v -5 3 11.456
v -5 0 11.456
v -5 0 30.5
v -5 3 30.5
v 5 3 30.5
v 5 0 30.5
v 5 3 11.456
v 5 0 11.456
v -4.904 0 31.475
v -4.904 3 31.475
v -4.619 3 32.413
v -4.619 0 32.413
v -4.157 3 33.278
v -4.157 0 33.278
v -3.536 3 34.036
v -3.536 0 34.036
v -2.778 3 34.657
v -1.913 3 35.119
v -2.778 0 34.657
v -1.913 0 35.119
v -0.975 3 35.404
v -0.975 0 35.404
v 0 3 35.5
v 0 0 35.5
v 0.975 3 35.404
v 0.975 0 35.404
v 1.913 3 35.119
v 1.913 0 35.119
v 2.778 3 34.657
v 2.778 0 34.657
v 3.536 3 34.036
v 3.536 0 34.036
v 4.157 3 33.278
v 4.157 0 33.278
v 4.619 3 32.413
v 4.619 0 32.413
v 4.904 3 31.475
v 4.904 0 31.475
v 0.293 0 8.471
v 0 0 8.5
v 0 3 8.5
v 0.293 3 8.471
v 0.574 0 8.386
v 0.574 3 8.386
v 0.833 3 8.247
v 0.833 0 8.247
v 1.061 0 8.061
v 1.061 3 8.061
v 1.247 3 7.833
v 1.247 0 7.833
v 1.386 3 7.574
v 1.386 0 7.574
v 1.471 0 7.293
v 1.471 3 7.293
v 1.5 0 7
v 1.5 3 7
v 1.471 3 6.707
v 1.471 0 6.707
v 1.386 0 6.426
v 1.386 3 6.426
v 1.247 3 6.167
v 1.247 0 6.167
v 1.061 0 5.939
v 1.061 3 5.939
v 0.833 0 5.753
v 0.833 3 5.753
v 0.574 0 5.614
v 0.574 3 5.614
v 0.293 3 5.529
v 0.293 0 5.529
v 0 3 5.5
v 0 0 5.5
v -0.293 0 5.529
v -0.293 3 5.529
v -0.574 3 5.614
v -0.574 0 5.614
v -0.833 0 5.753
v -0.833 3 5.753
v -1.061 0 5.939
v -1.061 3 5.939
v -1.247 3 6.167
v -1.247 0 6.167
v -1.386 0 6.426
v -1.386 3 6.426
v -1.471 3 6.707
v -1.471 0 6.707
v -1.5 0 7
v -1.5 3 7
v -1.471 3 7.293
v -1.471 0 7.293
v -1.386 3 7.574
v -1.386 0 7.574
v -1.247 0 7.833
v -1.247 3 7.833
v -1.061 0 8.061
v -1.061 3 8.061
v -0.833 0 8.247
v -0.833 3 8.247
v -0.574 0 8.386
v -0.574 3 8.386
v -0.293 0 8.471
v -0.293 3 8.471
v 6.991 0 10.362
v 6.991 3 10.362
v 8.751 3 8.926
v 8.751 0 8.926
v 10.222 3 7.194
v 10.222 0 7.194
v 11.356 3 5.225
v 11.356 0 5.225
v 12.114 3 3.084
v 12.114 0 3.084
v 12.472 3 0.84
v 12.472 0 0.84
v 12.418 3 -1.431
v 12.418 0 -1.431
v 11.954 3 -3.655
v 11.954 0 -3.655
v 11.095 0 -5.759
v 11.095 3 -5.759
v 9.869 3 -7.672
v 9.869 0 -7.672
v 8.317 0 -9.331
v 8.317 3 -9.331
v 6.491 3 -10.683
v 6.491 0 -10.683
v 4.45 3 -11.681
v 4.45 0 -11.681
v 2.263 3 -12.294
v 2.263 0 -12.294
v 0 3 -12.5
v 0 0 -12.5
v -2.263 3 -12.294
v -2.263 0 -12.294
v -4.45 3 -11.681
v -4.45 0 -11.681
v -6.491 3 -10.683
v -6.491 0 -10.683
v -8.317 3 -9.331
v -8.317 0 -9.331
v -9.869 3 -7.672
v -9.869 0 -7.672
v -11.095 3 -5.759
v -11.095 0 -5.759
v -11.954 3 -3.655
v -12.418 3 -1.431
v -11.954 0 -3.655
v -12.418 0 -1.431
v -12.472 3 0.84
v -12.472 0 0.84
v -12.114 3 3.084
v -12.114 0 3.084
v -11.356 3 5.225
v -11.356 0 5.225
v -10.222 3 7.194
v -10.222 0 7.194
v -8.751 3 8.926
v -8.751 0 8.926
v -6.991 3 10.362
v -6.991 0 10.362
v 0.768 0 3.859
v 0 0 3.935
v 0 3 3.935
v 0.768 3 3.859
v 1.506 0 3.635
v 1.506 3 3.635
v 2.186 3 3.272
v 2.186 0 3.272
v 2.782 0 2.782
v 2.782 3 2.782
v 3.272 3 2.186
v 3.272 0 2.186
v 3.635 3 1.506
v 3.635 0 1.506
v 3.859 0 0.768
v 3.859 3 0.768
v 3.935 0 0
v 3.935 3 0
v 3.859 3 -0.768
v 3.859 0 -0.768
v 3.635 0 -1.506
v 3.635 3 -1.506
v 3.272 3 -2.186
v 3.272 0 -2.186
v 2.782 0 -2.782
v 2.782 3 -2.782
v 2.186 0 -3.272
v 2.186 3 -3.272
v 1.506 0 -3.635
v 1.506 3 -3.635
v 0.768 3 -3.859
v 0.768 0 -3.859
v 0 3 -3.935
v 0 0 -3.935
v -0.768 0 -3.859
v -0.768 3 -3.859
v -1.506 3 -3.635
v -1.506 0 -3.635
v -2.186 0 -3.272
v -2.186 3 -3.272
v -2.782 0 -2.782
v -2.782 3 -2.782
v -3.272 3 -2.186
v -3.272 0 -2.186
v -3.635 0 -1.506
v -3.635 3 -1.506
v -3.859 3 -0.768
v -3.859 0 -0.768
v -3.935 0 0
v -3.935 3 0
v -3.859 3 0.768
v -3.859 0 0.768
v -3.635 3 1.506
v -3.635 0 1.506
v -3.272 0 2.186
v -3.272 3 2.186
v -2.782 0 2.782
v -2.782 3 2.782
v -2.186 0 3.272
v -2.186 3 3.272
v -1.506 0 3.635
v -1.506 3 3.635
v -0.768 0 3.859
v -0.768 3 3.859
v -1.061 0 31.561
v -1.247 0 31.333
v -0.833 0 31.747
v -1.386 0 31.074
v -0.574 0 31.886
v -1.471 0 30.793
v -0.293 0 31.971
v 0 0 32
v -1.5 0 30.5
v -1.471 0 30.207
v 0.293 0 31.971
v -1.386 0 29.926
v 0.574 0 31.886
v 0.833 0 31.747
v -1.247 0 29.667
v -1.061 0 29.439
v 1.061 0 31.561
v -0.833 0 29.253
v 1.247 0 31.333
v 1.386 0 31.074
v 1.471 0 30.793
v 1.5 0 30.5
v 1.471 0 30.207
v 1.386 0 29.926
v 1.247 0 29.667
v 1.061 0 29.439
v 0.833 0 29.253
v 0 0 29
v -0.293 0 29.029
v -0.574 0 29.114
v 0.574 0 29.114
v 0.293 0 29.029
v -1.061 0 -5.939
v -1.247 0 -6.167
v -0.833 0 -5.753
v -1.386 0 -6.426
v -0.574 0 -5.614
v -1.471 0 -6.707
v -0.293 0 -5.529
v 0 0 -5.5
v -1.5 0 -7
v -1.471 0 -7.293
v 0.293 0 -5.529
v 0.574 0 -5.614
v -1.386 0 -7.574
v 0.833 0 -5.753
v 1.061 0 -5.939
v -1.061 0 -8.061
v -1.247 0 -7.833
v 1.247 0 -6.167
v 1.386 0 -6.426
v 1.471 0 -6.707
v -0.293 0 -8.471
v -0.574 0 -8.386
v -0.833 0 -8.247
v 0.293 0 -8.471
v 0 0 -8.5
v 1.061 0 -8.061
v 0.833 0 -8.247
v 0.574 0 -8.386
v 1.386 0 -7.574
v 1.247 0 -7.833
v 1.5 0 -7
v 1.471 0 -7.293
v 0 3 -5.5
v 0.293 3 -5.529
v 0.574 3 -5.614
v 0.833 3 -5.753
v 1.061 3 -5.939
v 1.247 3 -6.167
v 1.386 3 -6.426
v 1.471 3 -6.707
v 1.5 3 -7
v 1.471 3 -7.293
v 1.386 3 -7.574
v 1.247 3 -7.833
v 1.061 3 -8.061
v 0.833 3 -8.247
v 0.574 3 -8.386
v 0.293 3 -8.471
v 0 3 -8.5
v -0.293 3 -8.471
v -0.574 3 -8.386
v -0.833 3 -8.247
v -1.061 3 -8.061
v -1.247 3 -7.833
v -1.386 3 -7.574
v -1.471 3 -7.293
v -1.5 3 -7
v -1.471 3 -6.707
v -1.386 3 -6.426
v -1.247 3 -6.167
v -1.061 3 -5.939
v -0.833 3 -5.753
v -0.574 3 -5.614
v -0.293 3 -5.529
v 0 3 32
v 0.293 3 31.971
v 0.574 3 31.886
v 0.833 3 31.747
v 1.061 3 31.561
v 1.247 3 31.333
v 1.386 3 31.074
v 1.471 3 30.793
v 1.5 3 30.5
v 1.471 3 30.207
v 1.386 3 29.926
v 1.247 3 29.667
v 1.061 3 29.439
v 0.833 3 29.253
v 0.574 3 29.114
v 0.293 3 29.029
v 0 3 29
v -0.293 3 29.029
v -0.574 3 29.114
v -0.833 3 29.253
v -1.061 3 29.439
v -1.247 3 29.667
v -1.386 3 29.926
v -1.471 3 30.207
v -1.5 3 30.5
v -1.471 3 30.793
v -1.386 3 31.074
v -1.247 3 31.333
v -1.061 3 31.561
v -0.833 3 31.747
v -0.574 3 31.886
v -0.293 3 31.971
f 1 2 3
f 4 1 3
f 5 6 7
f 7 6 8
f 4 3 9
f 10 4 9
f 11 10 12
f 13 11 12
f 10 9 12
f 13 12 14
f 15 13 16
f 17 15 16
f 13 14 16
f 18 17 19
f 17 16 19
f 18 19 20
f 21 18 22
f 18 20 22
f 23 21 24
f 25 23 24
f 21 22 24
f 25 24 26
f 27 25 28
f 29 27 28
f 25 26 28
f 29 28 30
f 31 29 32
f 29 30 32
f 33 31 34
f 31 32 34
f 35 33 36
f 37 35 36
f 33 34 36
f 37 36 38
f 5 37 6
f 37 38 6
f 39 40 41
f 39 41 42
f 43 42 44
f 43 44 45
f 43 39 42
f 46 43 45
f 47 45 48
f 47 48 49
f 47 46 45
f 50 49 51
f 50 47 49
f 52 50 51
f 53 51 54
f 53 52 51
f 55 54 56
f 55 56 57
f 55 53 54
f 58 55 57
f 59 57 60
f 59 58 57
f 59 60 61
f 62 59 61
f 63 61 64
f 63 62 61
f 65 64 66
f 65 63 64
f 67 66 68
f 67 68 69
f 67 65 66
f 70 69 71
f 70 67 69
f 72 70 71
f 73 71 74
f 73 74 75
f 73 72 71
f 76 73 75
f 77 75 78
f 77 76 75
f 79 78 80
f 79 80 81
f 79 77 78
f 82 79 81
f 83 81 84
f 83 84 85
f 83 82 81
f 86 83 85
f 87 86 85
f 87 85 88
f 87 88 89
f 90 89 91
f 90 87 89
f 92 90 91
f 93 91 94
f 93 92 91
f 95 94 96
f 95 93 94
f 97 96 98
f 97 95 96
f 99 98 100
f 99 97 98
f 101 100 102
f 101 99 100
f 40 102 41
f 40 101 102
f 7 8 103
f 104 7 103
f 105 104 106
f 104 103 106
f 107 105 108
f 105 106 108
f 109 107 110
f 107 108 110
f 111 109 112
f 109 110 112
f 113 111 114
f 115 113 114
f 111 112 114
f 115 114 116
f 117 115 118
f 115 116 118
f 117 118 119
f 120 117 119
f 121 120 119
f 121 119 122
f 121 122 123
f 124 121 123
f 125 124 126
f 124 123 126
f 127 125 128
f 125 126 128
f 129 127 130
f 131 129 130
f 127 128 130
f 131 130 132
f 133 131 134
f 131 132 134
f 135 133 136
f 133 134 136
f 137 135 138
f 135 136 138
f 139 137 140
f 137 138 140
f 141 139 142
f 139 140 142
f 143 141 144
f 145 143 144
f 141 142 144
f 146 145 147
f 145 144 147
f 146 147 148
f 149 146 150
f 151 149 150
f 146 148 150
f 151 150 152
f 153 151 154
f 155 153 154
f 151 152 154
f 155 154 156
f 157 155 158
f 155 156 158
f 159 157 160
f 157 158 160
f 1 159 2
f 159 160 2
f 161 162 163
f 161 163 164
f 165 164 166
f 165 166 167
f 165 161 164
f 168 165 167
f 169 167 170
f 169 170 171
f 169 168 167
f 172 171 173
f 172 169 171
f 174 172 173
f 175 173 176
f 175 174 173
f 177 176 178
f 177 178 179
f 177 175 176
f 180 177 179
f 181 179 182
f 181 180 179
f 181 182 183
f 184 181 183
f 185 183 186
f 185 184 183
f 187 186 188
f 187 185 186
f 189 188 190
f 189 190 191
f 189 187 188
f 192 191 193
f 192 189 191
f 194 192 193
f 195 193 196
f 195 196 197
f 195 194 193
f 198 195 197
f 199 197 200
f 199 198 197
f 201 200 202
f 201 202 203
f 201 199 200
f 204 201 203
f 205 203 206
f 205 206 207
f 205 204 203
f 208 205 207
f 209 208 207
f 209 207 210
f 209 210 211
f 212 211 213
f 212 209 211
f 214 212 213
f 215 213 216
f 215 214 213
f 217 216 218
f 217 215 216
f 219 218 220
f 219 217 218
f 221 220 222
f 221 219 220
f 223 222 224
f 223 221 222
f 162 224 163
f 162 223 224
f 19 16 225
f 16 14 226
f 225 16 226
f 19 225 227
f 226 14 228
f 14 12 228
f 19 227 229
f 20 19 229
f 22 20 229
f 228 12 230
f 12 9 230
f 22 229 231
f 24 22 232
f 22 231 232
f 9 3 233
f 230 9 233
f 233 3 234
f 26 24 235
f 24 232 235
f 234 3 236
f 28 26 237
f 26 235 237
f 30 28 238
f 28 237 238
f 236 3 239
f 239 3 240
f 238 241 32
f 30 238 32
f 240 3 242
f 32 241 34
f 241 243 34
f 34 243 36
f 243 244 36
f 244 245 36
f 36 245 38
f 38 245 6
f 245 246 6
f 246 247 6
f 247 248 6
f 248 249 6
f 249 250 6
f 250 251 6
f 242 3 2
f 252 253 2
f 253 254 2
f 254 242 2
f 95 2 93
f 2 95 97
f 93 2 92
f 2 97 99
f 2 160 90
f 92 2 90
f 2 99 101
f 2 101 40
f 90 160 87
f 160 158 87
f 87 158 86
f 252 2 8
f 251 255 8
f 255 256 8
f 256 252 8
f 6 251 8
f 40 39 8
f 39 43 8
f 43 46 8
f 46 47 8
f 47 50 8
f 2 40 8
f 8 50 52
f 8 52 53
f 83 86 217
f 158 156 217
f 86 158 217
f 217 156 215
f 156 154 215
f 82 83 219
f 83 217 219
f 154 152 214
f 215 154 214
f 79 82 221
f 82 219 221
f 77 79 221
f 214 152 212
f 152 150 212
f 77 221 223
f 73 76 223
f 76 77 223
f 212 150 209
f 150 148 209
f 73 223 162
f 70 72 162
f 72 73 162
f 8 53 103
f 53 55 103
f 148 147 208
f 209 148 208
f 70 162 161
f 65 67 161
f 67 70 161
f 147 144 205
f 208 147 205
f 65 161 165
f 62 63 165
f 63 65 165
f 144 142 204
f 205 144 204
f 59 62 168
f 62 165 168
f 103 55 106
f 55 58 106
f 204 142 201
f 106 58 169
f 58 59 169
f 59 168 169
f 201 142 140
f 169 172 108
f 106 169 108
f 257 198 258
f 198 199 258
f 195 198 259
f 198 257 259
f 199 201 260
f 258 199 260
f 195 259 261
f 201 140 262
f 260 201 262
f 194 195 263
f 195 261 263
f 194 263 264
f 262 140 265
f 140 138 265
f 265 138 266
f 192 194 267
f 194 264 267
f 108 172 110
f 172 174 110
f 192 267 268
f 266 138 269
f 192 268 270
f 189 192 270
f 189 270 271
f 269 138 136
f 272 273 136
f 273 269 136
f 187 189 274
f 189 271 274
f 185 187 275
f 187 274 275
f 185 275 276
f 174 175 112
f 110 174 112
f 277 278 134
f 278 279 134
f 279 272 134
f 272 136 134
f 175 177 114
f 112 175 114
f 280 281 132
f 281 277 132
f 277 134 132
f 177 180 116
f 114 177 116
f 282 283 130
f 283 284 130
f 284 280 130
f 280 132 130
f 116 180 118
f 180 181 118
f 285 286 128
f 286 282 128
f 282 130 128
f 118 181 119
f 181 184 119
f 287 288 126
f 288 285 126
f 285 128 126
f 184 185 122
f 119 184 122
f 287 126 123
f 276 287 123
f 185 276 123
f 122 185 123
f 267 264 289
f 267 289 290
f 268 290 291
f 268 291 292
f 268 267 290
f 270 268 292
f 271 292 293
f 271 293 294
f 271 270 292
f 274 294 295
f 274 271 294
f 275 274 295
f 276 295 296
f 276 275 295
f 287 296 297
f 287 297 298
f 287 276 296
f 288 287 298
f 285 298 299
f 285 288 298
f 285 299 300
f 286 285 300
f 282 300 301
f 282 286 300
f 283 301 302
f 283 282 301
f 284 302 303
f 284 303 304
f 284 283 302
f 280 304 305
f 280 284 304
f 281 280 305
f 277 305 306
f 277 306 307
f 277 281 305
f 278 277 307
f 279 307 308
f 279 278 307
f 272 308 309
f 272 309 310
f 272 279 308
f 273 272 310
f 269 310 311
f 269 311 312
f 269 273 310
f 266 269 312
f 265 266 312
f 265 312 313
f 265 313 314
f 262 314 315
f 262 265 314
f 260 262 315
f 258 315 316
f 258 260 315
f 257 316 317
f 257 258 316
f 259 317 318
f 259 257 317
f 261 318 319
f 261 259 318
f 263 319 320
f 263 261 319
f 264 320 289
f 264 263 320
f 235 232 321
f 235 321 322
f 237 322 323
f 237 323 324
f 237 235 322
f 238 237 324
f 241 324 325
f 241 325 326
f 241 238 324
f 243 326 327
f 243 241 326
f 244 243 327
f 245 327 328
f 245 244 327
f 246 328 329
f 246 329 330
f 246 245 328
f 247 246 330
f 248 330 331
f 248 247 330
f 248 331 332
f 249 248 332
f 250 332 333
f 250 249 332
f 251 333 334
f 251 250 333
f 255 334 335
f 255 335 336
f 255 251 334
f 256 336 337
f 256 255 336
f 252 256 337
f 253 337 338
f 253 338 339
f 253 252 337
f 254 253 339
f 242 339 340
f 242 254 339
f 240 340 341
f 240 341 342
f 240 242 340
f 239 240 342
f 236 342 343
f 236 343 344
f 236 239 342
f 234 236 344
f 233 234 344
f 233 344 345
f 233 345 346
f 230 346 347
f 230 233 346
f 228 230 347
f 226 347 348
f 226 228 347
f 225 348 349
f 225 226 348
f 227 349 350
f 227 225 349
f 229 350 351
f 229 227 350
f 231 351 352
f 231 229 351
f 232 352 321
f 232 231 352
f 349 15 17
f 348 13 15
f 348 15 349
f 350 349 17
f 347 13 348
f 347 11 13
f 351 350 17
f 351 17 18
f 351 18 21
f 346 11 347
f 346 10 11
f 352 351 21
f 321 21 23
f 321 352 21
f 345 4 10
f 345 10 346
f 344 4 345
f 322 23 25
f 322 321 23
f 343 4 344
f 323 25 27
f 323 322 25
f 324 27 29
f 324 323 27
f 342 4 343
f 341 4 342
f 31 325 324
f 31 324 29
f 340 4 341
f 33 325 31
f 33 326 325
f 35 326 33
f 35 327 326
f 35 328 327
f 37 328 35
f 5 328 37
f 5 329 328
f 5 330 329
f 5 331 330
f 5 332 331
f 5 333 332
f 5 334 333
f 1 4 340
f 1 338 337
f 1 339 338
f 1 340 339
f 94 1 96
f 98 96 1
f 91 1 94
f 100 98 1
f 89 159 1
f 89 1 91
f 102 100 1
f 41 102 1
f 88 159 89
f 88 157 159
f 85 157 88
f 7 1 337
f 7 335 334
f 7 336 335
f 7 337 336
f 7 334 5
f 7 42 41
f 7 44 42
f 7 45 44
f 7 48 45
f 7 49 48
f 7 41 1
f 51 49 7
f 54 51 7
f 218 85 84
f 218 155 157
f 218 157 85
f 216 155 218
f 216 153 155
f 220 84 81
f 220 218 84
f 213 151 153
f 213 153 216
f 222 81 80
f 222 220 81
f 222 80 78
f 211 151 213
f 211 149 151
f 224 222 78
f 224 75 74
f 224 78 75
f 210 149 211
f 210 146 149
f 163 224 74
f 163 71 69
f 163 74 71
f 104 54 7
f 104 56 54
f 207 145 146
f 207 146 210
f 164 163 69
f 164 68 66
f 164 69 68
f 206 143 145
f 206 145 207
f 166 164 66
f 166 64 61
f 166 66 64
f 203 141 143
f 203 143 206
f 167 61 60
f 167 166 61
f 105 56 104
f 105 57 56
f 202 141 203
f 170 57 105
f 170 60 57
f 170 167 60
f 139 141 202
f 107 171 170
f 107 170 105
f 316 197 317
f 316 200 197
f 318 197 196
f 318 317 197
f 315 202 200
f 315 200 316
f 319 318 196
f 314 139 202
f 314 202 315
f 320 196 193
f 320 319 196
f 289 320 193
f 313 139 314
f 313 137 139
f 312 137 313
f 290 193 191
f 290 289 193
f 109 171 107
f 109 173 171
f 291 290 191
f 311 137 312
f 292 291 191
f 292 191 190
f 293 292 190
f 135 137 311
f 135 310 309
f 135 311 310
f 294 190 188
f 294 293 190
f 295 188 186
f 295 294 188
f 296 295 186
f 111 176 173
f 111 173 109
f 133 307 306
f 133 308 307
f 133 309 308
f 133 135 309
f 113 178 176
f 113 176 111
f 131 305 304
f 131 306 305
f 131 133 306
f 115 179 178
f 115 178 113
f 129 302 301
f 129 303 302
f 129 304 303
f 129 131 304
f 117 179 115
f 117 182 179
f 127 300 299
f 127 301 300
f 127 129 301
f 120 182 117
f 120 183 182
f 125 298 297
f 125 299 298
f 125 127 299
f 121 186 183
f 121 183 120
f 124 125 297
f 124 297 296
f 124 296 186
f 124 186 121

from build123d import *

# Parameters (mm, degrees)
SKETCH1_R           = 3.935
SKETCH1_R_2         = 1.5
BOSS_EXTRUDE1_DEPTH = 3


with BuildPart() as part:
    # Sketch1 → Boss-Extrude1 (new body)
    with BuildSketch(Plane(origin=(0, 0, 0), x_dir=(1, 0, 0), z_dir=(0, 1, 0))):
        with BuildLine():
            Line((-5, -11.456439237), (-5, -30.5))
            ThreePointArc((-5, -30.5), (0, -35.5), (5, -30.5))
            Line((5, -30.5), (5, -11.456439237))
            ThreePointArc((5, -11.456439237), (0, 12.5), (-5, -11.456439237))
        make_face()
        with Locations(Location((0, 0, 0), (0, 0, 270))):
            Circle(SKETCH1_R, mode=Mode.SUBTRACT)
        with Locations(Location((0, 7, 0), (0, 0, 270))):
            Circle(SKETCH1_R_2, mode=Mode.SUBTRACT)
        with Locations(Location((0, -7, 0), (0, 0, 270))):
            Circle(SKETCH1_R_2, mode=Mode.SUBTRACT)
        with Locations(Location((0, -30.5, 0), (0, 0, 270))):
            Circle(SKETCH1_R_2, mode=Mode.SUBTRACT)
    extrude(amount=BOSS_EXTRUDE1_DEPTH)


solid = part.part
